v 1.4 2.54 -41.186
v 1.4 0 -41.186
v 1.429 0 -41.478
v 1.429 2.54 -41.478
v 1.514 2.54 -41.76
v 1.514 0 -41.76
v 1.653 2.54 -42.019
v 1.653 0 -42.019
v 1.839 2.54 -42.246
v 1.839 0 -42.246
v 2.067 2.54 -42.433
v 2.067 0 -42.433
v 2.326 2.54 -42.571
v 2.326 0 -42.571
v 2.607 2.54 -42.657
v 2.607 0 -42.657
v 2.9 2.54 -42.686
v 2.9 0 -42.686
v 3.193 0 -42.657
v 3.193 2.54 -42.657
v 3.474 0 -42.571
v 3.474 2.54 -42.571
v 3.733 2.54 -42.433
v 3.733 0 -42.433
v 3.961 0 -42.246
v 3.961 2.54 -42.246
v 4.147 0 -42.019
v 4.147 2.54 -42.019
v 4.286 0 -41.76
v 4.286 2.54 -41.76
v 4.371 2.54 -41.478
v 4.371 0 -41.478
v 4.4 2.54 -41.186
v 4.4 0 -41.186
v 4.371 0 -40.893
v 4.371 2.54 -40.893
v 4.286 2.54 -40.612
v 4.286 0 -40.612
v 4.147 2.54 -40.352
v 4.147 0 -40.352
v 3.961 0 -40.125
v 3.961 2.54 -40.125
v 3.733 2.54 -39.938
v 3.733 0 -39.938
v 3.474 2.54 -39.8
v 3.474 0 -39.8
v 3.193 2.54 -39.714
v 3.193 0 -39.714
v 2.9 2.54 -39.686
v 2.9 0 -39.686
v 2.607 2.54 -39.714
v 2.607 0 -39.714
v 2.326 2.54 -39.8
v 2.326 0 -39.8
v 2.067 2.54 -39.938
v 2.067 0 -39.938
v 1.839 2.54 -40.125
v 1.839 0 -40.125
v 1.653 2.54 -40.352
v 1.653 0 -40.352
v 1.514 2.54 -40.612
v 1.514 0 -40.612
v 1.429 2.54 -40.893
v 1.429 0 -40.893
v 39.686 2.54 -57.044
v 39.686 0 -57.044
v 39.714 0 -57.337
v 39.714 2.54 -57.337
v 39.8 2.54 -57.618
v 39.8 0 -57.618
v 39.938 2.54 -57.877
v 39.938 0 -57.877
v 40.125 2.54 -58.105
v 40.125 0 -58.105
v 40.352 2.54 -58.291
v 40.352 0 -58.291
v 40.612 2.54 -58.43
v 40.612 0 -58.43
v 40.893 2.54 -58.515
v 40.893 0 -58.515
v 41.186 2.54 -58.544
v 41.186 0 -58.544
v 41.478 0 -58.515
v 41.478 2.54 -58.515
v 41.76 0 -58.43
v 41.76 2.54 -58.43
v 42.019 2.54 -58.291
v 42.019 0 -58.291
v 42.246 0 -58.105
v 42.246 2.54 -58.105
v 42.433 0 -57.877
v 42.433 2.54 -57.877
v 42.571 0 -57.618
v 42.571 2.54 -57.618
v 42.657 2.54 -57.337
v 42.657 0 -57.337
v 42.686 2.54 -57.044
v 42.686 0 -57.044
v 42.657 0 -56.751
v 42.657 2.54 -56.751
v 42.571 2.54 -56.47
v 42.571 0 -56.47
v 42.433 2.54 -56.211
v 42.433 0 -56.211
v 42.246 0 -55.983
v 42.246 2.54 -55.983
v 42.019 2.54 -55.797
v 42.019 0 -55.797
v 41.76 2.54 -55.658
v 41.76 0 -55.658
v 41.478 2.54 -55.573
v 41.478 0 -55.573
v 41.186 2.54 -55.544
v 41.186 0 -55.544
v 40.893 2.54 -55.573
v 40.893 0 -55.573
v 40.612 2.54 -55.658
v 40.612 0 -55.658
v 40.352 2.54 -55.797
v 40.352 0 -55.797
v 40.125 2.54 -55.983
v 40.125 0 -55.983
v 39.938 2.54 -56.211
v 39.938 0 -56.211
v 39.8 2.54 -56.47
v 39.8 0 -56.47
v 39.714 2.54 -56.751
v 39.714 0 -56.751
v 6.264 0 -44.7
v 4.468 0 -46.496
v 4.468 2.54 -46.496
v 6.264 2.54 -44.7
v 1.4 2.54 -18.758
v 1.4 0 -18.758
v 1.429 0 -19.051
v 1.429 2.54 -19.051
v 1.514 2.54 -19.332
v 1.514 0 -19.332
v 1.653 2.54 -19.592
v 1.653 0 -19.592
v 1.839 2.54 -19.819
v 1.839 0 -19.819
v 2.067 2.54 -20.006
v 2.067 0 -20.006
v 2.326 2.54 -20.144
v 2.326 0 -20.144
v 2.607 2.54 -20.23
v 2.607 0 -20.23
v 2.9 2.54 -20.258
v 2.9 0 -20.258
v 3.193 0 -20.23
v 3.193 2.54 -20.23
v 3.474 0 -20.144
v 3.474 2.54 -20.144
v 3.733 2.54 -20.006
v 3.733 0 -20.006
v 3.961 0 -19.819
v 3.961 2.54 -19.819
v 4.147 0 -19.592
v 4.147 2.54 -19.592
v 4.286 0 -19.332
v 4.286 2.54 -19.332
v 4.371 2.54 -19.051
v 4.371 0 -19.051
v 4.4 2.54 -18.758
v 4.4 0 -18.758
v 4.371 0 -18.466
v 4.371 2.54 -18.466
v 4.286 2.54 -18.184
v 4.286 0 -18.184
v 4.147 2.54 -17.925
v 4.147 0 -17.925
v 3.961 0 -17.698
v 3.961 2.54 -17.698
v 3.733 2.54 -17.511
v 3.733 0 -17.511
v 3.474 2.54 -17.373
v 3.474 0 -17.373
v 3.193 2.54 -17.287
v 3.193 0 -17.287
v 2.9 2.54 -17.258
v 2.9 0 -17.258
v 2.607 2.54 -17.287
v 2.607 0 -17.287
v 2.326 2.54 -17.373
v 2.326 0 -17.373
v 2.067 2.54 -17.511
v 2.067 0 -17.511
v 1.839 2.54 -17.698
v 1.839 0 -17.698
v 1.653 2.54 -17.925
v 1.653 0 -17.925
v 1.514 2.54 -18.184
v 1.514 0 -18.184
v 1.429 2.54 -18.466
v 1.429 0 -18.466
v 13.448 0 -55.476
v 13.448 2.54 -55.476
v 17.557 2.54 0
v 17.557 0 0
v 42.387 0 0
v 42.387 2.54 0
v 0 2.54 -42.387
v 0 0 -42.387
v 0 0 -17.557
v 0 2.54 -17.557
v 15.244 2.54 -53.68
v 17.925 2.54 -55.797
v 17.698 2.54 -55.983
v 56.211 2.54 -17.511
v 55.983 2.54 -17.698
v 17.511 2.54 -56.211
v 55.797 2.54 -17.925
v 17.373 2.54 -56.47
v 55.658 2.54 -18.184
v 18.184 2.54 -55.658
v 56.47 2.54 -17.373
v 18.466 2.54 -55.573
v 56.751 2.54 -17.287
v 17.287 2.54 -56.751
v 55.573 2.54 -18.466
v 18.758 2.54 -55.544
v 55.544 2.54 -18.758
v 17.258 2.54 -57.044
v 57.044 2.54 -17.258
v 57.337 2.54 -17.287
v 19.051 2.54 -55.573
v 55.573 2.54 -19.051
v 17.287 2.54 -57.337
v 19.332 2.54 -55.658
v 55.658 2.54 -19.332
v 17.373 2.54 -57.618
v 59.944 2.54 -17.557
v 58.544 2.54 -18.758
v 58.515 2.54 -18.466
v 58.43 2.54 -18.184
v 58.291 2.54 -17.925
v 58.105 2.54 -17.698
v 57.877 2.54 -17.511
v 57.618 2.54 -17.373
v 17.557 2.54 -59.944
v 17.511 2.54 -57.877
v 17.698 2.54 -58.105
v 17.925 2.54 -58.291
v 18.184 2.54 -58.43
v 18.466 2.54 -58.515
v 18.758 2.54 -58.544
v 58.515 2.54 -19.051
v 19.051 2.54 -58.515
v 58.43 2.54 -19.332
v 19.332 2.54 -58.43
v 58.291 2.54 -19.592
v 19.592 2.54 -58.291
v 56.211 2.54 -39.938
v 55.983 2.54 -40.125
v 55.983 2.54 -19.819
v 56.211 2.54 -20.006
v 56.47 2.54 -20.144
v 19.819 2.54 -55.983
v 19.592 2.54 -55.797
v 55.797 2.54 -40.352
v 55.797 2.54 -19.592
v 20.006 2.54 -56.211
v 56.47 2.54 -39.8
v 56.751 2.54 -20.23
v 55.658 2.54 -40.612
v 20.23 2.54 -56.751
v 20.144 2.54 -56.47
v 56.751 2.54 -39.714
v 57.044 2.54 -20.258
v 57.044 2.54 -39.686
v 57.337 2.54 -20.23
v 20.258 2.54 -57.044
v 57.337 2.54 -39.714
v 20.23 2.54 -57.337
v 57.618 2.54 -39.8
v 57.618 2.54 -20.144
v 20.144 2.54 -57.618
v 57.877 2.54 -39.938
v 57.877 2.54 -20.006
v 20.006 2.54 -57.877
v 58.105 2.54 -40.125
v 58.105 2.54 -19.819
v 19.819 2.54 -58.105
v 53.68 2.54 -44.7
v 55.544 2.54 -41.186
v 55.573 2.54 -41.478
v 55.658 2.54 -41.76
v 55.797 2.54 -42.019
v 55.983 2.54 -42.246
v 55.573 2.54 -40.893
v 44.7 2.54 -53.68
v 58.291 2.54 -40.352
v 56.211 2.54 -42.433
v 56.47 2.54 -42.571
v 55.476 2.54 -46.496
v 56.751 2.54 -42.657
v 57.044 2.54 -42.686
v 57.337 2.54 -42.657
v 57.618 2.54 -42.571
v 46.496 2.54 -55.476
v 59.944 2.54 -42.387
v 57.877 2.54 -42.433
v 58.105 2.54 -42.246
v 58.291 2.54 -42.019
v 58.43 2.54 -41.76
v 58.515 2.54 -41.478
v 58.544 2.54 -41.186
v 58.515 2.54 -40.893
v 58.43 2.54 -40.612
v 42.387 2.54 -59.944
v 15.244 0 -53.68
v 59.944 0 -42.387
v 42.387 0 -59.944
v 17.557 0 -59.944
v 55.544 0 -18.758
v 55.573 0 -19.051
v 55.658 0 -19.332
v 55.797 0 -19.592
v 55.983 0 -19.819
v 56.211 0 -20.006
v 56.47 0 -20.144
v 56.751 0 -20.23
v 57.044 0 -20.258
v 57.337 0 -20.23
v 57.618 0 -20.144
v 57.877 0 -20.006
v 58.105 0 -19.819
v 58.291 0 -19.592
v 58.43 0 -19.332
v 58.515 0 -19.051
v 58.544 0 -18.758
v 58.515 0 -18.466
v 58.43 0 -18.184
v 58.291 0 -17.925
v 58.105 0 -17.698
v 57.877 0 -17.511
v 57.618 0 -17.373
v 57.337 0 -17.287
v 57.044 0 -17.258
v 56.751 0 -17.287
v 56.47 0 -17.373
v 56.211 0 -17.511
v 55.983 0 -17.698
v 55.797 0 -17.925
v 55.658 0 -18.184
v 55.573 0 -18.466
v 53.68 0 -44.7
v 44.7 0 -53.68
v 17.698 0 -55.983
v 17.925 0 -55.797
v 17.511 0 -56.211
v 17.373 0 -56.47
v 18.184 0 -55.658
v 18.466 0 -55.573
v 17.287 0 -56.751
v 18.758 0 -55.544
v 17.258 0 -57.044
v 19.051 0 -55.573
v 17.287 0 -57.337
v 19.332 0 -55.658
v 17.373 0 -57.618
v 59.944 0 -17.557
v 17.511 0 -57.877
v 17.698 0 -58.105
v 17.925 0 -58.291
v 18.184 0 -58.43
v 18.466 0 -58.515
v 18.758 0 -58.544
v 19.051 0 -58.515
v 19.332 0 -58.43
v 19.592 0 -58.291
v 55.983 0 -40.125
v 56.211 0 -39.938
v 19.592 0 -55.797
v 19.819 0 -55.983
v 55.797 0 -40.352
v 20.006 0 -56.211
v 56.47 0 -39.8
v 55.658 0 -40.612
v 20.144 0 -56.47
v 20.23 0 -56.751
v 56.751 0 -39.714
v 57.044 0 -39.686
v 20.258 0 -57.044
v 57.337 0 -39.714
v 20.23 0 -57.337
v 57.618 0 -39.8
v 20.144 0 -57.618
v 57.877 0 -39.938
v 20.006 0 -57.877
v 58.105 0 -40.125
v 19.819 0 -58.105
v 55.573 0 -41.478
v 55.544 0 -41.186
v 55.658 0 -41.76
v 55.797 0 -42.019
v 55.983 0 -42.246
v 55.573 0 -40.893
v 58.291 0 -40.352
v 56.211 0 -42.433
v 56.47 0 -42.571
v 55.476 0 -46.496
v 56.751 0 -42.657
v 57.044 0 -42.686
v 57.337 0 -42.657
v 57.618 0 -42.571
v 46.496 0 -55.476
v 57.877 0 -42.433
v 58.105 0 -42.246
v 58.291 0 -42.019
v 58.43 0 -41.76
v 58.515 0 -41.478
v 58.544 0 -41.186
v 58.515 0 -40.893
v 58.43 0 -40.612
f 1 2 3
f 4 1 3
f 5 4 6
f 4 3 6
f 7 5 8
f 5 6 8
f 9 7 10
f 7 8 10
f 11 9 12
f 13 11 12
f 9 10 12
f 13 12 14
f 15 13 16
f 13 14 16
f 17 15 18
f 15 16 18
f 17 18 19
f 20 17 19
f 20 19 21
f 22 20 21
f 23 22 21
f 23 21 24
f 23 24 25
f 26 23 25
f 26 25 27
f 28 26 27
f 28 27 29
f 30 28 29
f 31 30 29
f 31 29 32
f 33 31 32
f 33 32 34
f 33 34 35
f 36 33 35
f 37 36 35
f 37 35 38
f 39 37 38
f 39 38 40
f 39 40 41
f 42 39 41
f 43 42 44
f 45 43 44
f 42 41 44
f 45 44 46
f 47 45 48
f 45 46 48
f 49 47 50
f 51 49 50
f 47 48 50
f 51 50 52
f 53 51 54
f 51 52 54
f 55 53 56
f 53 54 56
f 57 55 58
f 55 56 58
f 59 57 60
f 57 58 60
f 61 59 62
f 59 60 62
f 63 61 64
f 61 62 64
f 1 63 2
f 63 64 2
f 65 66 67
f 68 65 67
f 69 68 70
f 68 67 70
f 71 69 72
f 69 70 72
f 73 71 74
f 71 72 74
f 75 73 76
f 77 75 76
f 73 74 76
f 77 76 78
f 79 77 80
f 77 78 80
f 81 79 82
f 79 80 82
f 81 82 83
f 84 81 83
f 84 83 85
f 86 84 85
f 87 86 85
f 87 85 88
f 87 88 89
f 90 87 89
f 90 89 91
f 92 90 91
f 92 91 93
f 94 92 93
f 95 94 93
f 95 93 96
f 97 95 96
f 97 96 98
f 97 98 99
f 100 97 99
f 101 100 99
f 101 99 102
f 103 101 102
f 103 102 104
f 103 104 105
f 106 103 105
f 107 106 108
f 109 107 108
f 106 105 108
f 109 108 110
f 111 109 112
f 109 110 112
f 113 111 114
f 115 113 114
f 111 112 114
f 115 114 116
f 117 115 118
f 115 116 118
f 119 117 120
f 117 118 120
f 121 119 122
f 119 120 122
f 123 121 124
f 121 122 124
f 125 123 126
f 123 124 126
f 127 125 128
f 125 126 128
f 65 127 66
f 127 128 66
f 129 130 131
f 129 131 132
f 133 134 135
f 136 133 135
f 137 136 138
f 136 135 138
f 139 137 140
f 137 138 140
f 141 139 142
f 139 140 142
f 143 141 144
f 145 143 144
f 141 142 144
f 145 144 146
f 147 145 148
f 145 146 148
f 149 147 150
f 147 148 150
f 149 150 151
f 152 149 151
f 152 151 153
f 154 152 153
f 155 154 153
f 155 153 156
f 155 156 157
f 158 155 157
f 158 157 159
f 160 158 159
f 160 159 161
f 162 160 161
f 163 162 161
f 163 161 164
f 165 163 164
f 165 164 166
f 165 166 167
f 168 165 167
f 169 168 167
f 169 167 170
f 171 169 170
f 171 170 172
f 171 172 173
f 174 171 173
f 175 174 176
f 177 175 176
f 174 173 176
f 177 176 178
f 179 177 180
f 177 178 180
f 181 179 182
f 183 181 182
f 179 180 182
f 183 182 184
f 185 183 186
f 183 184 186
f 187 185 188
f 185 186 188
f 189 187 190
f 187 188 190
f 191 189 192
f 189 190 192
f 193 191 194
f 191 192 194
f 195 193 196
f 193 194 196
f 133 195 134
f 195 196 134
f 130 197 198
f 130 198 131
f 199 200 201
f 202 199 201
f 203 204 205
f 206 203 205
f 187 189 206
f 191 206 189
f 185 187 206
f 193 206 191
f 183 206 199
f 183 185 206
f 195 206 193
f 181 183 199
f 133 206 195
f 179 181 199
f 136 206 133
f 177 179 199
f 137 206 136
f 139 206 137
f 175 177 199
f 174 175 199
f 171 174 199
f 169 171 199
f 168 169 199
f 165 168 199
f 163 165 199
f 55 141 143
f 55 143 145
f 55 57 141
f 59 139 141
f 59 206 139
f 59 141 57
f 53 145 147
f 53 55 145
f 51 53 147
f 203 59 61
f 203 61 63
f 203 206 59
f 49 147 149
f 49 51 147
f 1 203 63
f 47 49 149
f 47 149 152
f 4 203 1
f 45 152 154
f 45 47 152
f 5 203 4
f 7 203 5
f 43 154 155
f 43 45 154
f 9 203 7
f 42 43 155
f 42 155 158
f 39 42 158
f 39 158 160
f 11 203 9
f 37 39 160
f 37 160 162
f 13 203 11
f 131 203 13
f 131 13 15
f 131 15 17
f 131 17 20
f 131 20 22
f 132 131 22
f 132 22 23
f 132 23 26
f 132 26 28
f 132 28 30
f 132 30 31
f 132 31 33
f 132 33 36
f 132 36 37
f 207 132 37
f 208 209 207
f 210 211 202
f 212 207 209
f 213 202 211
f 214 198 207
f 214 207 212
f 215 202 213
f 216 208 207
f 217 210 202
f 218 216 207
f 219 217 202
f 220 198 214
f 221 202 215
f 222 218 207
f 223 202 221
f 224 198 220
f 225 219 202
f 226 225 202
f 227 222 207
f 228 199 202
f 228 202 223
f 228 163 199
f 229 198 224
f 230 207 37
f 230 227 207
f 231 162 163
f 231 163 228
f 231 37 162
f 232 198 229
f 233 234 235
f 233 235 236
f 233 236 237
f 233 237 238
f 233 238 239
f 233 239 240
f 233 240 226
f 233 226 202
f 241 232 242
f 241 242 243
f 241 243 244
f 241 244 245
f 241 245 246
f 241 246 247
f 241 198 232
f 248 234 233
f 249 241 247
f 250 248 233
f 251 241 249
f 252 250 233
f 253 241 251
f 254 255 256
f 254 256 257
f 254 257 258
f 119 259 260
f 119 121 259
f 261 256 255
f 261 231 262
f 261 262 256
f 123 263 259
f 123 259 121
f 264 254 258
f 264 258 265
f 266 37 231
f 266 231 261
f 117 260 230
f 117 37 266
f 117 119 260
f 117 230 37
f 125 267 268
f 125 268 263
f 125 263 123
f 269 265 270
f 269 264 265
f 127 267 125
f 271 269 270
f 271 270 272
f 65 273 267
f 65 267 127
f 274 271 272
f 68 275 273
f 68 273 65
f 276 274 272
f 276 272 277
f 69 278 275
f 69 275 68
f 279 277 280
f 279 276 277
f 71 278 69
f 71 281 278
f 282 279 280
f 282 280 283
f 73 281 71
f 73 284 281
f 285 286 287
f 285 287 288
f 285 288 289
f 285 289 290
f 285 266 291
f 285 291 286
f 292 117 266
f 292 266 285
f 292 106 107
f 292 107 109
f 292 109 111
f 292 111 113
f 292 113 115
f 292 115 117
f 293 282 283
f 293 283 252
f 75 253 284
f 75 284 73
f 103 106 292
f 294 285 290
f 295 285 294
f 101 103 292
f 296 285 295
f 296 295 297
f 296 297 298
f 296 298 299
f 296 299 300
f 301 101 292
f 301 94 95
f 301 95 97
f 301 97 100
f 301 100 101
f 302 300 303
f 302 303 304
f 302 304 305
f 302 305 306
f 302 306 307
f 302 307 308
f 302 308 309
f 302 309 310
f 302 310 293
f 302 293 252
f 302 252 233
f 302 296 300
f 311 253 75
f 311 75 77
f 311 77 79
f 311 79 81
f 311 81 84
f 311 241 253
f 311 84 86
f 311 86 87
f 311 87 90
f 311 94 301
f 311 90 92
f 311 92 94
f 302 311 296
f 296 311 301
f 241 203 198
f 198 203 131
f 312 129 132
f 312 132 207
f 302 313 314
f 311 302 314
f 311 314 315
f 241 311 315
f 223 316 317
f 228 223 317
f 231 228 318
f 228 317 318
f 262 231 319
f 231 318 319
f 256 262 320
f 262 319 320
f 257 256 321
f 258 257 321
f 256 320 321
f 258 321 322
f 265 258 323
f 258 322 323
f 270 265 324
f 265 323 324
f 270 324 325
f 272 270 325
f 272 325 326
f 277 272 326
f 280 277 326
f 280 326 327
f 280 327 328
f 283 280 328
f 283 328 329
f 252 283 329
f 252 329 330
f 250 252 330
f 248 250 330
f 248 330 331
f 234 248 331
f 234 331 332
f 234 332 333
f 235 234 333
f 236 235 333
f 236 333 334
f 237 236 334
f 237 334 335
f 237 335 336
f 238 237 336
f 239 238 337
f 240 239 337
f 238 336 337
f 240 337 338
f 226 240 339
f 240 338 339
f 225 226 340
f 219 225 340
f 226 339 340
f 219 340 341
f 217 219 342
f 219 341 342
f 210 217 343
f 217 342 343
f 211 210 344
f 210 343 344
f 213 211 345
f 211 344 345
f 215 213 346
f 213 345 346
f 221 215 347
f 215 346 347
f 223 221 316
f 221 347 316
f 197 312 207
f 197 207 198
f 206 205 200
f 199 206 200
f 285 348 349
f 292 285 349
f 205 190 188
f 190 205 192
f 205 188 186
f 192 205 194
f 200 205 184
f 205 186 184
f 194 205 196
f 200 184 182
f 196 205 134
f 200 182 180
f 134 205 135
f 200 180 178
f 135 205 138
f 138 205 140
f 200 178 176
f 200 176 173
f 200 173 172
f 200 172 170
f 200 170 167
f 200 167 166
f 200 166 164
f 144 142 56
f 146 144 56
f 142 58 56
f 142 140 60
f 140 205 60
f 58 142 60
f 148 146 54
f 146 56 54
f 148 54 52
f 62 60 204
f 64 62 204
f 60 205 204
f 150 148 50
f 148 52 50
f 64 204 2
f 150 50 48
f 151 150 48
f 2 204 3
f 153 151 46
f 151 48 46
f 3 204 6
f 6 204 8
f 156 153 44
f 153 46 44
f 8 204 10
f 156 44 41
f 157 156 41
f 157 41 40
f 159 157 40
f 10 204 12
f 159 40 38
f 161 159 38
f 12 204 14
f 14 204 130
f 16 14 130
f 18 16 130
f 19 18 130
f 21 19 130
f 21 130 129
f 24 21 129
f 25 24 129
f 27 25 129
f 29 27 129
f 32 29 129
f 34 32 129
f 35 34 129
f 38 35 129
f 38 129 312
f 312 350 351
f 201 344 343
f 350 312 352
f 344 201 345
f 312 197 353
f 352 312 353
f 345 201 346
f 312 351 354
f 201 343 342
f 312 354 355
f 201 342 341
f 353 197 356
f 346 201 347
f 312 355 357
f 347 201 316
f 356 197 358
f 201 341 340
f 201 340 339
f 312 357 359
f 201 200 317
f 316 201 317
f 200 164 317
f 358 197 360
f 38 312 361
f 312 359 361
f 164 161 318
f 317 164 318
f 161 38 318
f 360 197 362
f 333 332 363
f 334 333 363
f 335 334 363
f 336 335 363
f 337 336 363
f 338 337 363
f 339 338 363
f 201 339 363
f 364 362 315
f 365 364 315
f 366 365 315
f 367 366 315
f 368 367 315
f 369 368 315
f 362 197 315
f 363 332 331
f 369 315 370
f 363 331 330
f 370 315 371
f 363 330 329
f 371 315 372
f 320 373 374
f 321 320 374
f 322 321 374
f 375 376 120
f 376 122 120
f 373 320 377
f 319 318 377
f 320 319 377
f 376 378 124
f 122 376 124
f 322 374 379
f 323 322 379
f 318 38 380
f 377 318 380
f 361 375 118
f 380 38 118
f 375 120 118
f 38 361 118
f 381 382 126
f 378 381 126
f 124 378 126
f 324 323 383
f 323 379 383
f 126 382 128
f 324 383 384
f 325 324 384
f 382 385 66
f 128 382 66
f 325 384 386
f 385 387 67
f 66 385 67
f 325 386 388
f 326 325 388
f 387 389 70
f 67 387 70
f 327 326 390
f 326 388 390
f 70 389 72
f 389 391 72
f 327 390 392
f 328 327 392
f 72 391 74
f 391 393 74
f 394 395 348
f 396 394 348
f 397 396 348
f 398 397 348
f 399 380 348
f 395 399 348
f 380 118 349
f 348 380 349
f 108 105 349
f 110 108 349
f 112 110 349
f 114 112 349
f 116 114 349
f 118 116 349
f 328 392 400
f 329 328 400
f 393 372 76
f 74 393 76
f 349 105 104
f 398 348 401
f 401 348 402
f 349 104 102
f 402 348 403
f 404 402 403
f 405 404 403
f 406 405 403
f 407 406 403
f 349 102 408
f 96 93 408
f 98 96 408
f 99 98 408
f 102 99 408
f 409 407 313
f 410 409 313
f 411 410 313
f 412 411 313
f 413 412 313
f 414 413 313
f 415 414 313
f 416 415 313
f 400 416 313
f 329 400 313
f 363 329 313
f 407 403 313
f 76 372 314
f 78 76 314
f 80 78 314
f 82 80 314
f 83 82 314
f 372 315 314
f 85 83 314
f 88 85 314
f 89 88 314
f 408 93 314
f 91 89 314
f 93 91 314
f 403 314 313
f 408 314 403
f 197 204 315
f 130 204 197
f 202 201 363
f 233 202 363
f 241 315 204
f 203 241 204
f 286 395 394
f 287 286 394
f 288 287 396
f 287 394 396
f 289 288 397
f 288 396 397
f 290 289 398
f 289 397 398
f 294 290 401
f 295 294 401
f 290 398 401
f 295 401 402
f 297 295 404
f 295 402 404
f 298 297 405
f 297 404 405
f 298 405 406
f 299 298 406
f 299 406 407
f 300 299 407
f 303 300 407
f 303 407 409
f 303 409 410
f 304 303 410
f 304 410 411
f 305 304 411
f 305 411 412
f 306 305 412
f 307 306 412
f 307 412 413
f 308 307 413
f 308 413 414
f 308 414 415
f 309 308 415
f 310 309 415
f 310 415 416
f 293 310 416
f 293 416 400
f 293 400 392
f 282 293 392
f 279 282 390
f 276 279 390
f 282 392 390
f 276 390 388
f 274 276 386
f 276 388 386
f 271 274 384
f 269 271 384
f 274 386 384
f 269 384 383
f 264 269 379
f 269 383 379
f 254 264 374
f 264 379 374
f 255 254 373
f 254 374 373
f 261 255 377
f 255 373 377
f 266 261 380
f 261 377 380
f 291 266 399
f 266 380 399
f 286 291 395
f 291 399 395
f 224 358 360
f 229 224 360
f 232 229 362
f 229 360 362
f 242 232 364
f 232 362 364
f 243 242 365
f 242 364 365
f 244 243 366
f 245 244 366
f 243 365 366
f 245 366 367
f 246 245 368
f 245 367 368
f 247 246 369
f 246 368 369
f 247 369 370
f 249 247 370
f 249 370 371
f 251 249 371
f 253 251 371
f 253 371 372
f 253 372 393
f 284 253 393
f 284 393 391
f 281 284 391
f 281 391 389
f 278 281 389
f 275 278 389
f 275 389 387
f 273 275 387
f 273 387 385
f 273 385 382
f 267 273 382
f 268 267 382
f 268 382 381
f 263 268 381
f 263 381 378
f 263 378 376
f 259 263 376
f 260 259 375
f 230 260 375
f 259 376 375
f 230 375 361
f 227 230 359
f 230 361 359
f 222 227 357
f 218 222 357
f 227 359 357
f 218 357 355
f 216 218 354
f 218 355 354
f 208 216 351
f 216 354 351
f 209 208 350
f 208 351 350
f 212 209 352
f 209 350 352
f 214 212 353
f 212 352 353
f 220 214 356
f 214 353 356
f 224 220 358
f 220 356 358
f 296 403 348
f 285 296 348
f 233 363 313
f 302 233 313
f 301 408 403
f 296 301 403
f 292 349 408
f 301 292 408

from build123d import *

# Parameters (mm, degrees)
BOSS_EXTRUDE1_DEPTH       = 2.54
F_3_0MM_DOWEL_HOLE1_D     = 3
F_3_0MM_DOWEL_HOLE1_DEPTH = 7.999984
F_3_0MM_DOWEL_HOLE1_TIP   = 0.901290929


with BuildPart() as part:
    # Sketch1 → Boss-Extrude1 (new body)
    with BuildSketch(Plane(origin=(0, 0, 0), x_dir=(1, 0, 0), z_dir=(0, 1, 0))):
        Polygon((59.944, 42.386808891), (42.386808891, 59.944), (17.557191109, 59.944), (0, 42.386808891), (0, 17.557191109), (17.557191109, 0), (42.386808891, 0), (59.944, 17.557191109), align=None)
        Polygon((4.468072616, 46.495671263), (6.26412384, 44.699620039), (15.244379961, 53.67987616), (13.448328737, 55.475927384), align=None, mode=Mode.SUBTRACT)
        Polygon((53.67987616, 44.699620039), (44.699620039, 53.67987616), (46.495671263, 55.475927384), (55.475927384, 46.495671263), align=None, mode=Mode.SUBTRACT)
    extrude(amount=BOSS_EXTRUDE1_DEPTH)

    # Ø3.0mm Dowel Hole1
    with Locations(Plane(origin=(0, 2.54, 0), x_dir=(1, 0, 0), z_dir=(0, 1, 0))):
        with Locations((2.9, 18.758410439), (57.044, 18.758410439), (2.9, 41.18558956), (57.044, 41.185589561), (18.758410439, 57.044), (41.185589561, 57.044)):
            Hole(F_3_0MM_DOWEL_HOLE1_D / 2, depth=F_3_0MM_DOWEL_HOLE1_DEPTH)
            with Locations((0, 0, -(F_3_0MM_DOWEL_HOLE1_DEPTH + F_3_0MM_DOWEL_HOLE1_TIP / 2))):  # 118° drill point
                Cone(0, F_3_0MM_DOWEL_HOLE1_D / 2, F_3_0MM_DOWEL_HOLE1_TIP, mode=Mode.SUBTRACT)


solid = part.part
